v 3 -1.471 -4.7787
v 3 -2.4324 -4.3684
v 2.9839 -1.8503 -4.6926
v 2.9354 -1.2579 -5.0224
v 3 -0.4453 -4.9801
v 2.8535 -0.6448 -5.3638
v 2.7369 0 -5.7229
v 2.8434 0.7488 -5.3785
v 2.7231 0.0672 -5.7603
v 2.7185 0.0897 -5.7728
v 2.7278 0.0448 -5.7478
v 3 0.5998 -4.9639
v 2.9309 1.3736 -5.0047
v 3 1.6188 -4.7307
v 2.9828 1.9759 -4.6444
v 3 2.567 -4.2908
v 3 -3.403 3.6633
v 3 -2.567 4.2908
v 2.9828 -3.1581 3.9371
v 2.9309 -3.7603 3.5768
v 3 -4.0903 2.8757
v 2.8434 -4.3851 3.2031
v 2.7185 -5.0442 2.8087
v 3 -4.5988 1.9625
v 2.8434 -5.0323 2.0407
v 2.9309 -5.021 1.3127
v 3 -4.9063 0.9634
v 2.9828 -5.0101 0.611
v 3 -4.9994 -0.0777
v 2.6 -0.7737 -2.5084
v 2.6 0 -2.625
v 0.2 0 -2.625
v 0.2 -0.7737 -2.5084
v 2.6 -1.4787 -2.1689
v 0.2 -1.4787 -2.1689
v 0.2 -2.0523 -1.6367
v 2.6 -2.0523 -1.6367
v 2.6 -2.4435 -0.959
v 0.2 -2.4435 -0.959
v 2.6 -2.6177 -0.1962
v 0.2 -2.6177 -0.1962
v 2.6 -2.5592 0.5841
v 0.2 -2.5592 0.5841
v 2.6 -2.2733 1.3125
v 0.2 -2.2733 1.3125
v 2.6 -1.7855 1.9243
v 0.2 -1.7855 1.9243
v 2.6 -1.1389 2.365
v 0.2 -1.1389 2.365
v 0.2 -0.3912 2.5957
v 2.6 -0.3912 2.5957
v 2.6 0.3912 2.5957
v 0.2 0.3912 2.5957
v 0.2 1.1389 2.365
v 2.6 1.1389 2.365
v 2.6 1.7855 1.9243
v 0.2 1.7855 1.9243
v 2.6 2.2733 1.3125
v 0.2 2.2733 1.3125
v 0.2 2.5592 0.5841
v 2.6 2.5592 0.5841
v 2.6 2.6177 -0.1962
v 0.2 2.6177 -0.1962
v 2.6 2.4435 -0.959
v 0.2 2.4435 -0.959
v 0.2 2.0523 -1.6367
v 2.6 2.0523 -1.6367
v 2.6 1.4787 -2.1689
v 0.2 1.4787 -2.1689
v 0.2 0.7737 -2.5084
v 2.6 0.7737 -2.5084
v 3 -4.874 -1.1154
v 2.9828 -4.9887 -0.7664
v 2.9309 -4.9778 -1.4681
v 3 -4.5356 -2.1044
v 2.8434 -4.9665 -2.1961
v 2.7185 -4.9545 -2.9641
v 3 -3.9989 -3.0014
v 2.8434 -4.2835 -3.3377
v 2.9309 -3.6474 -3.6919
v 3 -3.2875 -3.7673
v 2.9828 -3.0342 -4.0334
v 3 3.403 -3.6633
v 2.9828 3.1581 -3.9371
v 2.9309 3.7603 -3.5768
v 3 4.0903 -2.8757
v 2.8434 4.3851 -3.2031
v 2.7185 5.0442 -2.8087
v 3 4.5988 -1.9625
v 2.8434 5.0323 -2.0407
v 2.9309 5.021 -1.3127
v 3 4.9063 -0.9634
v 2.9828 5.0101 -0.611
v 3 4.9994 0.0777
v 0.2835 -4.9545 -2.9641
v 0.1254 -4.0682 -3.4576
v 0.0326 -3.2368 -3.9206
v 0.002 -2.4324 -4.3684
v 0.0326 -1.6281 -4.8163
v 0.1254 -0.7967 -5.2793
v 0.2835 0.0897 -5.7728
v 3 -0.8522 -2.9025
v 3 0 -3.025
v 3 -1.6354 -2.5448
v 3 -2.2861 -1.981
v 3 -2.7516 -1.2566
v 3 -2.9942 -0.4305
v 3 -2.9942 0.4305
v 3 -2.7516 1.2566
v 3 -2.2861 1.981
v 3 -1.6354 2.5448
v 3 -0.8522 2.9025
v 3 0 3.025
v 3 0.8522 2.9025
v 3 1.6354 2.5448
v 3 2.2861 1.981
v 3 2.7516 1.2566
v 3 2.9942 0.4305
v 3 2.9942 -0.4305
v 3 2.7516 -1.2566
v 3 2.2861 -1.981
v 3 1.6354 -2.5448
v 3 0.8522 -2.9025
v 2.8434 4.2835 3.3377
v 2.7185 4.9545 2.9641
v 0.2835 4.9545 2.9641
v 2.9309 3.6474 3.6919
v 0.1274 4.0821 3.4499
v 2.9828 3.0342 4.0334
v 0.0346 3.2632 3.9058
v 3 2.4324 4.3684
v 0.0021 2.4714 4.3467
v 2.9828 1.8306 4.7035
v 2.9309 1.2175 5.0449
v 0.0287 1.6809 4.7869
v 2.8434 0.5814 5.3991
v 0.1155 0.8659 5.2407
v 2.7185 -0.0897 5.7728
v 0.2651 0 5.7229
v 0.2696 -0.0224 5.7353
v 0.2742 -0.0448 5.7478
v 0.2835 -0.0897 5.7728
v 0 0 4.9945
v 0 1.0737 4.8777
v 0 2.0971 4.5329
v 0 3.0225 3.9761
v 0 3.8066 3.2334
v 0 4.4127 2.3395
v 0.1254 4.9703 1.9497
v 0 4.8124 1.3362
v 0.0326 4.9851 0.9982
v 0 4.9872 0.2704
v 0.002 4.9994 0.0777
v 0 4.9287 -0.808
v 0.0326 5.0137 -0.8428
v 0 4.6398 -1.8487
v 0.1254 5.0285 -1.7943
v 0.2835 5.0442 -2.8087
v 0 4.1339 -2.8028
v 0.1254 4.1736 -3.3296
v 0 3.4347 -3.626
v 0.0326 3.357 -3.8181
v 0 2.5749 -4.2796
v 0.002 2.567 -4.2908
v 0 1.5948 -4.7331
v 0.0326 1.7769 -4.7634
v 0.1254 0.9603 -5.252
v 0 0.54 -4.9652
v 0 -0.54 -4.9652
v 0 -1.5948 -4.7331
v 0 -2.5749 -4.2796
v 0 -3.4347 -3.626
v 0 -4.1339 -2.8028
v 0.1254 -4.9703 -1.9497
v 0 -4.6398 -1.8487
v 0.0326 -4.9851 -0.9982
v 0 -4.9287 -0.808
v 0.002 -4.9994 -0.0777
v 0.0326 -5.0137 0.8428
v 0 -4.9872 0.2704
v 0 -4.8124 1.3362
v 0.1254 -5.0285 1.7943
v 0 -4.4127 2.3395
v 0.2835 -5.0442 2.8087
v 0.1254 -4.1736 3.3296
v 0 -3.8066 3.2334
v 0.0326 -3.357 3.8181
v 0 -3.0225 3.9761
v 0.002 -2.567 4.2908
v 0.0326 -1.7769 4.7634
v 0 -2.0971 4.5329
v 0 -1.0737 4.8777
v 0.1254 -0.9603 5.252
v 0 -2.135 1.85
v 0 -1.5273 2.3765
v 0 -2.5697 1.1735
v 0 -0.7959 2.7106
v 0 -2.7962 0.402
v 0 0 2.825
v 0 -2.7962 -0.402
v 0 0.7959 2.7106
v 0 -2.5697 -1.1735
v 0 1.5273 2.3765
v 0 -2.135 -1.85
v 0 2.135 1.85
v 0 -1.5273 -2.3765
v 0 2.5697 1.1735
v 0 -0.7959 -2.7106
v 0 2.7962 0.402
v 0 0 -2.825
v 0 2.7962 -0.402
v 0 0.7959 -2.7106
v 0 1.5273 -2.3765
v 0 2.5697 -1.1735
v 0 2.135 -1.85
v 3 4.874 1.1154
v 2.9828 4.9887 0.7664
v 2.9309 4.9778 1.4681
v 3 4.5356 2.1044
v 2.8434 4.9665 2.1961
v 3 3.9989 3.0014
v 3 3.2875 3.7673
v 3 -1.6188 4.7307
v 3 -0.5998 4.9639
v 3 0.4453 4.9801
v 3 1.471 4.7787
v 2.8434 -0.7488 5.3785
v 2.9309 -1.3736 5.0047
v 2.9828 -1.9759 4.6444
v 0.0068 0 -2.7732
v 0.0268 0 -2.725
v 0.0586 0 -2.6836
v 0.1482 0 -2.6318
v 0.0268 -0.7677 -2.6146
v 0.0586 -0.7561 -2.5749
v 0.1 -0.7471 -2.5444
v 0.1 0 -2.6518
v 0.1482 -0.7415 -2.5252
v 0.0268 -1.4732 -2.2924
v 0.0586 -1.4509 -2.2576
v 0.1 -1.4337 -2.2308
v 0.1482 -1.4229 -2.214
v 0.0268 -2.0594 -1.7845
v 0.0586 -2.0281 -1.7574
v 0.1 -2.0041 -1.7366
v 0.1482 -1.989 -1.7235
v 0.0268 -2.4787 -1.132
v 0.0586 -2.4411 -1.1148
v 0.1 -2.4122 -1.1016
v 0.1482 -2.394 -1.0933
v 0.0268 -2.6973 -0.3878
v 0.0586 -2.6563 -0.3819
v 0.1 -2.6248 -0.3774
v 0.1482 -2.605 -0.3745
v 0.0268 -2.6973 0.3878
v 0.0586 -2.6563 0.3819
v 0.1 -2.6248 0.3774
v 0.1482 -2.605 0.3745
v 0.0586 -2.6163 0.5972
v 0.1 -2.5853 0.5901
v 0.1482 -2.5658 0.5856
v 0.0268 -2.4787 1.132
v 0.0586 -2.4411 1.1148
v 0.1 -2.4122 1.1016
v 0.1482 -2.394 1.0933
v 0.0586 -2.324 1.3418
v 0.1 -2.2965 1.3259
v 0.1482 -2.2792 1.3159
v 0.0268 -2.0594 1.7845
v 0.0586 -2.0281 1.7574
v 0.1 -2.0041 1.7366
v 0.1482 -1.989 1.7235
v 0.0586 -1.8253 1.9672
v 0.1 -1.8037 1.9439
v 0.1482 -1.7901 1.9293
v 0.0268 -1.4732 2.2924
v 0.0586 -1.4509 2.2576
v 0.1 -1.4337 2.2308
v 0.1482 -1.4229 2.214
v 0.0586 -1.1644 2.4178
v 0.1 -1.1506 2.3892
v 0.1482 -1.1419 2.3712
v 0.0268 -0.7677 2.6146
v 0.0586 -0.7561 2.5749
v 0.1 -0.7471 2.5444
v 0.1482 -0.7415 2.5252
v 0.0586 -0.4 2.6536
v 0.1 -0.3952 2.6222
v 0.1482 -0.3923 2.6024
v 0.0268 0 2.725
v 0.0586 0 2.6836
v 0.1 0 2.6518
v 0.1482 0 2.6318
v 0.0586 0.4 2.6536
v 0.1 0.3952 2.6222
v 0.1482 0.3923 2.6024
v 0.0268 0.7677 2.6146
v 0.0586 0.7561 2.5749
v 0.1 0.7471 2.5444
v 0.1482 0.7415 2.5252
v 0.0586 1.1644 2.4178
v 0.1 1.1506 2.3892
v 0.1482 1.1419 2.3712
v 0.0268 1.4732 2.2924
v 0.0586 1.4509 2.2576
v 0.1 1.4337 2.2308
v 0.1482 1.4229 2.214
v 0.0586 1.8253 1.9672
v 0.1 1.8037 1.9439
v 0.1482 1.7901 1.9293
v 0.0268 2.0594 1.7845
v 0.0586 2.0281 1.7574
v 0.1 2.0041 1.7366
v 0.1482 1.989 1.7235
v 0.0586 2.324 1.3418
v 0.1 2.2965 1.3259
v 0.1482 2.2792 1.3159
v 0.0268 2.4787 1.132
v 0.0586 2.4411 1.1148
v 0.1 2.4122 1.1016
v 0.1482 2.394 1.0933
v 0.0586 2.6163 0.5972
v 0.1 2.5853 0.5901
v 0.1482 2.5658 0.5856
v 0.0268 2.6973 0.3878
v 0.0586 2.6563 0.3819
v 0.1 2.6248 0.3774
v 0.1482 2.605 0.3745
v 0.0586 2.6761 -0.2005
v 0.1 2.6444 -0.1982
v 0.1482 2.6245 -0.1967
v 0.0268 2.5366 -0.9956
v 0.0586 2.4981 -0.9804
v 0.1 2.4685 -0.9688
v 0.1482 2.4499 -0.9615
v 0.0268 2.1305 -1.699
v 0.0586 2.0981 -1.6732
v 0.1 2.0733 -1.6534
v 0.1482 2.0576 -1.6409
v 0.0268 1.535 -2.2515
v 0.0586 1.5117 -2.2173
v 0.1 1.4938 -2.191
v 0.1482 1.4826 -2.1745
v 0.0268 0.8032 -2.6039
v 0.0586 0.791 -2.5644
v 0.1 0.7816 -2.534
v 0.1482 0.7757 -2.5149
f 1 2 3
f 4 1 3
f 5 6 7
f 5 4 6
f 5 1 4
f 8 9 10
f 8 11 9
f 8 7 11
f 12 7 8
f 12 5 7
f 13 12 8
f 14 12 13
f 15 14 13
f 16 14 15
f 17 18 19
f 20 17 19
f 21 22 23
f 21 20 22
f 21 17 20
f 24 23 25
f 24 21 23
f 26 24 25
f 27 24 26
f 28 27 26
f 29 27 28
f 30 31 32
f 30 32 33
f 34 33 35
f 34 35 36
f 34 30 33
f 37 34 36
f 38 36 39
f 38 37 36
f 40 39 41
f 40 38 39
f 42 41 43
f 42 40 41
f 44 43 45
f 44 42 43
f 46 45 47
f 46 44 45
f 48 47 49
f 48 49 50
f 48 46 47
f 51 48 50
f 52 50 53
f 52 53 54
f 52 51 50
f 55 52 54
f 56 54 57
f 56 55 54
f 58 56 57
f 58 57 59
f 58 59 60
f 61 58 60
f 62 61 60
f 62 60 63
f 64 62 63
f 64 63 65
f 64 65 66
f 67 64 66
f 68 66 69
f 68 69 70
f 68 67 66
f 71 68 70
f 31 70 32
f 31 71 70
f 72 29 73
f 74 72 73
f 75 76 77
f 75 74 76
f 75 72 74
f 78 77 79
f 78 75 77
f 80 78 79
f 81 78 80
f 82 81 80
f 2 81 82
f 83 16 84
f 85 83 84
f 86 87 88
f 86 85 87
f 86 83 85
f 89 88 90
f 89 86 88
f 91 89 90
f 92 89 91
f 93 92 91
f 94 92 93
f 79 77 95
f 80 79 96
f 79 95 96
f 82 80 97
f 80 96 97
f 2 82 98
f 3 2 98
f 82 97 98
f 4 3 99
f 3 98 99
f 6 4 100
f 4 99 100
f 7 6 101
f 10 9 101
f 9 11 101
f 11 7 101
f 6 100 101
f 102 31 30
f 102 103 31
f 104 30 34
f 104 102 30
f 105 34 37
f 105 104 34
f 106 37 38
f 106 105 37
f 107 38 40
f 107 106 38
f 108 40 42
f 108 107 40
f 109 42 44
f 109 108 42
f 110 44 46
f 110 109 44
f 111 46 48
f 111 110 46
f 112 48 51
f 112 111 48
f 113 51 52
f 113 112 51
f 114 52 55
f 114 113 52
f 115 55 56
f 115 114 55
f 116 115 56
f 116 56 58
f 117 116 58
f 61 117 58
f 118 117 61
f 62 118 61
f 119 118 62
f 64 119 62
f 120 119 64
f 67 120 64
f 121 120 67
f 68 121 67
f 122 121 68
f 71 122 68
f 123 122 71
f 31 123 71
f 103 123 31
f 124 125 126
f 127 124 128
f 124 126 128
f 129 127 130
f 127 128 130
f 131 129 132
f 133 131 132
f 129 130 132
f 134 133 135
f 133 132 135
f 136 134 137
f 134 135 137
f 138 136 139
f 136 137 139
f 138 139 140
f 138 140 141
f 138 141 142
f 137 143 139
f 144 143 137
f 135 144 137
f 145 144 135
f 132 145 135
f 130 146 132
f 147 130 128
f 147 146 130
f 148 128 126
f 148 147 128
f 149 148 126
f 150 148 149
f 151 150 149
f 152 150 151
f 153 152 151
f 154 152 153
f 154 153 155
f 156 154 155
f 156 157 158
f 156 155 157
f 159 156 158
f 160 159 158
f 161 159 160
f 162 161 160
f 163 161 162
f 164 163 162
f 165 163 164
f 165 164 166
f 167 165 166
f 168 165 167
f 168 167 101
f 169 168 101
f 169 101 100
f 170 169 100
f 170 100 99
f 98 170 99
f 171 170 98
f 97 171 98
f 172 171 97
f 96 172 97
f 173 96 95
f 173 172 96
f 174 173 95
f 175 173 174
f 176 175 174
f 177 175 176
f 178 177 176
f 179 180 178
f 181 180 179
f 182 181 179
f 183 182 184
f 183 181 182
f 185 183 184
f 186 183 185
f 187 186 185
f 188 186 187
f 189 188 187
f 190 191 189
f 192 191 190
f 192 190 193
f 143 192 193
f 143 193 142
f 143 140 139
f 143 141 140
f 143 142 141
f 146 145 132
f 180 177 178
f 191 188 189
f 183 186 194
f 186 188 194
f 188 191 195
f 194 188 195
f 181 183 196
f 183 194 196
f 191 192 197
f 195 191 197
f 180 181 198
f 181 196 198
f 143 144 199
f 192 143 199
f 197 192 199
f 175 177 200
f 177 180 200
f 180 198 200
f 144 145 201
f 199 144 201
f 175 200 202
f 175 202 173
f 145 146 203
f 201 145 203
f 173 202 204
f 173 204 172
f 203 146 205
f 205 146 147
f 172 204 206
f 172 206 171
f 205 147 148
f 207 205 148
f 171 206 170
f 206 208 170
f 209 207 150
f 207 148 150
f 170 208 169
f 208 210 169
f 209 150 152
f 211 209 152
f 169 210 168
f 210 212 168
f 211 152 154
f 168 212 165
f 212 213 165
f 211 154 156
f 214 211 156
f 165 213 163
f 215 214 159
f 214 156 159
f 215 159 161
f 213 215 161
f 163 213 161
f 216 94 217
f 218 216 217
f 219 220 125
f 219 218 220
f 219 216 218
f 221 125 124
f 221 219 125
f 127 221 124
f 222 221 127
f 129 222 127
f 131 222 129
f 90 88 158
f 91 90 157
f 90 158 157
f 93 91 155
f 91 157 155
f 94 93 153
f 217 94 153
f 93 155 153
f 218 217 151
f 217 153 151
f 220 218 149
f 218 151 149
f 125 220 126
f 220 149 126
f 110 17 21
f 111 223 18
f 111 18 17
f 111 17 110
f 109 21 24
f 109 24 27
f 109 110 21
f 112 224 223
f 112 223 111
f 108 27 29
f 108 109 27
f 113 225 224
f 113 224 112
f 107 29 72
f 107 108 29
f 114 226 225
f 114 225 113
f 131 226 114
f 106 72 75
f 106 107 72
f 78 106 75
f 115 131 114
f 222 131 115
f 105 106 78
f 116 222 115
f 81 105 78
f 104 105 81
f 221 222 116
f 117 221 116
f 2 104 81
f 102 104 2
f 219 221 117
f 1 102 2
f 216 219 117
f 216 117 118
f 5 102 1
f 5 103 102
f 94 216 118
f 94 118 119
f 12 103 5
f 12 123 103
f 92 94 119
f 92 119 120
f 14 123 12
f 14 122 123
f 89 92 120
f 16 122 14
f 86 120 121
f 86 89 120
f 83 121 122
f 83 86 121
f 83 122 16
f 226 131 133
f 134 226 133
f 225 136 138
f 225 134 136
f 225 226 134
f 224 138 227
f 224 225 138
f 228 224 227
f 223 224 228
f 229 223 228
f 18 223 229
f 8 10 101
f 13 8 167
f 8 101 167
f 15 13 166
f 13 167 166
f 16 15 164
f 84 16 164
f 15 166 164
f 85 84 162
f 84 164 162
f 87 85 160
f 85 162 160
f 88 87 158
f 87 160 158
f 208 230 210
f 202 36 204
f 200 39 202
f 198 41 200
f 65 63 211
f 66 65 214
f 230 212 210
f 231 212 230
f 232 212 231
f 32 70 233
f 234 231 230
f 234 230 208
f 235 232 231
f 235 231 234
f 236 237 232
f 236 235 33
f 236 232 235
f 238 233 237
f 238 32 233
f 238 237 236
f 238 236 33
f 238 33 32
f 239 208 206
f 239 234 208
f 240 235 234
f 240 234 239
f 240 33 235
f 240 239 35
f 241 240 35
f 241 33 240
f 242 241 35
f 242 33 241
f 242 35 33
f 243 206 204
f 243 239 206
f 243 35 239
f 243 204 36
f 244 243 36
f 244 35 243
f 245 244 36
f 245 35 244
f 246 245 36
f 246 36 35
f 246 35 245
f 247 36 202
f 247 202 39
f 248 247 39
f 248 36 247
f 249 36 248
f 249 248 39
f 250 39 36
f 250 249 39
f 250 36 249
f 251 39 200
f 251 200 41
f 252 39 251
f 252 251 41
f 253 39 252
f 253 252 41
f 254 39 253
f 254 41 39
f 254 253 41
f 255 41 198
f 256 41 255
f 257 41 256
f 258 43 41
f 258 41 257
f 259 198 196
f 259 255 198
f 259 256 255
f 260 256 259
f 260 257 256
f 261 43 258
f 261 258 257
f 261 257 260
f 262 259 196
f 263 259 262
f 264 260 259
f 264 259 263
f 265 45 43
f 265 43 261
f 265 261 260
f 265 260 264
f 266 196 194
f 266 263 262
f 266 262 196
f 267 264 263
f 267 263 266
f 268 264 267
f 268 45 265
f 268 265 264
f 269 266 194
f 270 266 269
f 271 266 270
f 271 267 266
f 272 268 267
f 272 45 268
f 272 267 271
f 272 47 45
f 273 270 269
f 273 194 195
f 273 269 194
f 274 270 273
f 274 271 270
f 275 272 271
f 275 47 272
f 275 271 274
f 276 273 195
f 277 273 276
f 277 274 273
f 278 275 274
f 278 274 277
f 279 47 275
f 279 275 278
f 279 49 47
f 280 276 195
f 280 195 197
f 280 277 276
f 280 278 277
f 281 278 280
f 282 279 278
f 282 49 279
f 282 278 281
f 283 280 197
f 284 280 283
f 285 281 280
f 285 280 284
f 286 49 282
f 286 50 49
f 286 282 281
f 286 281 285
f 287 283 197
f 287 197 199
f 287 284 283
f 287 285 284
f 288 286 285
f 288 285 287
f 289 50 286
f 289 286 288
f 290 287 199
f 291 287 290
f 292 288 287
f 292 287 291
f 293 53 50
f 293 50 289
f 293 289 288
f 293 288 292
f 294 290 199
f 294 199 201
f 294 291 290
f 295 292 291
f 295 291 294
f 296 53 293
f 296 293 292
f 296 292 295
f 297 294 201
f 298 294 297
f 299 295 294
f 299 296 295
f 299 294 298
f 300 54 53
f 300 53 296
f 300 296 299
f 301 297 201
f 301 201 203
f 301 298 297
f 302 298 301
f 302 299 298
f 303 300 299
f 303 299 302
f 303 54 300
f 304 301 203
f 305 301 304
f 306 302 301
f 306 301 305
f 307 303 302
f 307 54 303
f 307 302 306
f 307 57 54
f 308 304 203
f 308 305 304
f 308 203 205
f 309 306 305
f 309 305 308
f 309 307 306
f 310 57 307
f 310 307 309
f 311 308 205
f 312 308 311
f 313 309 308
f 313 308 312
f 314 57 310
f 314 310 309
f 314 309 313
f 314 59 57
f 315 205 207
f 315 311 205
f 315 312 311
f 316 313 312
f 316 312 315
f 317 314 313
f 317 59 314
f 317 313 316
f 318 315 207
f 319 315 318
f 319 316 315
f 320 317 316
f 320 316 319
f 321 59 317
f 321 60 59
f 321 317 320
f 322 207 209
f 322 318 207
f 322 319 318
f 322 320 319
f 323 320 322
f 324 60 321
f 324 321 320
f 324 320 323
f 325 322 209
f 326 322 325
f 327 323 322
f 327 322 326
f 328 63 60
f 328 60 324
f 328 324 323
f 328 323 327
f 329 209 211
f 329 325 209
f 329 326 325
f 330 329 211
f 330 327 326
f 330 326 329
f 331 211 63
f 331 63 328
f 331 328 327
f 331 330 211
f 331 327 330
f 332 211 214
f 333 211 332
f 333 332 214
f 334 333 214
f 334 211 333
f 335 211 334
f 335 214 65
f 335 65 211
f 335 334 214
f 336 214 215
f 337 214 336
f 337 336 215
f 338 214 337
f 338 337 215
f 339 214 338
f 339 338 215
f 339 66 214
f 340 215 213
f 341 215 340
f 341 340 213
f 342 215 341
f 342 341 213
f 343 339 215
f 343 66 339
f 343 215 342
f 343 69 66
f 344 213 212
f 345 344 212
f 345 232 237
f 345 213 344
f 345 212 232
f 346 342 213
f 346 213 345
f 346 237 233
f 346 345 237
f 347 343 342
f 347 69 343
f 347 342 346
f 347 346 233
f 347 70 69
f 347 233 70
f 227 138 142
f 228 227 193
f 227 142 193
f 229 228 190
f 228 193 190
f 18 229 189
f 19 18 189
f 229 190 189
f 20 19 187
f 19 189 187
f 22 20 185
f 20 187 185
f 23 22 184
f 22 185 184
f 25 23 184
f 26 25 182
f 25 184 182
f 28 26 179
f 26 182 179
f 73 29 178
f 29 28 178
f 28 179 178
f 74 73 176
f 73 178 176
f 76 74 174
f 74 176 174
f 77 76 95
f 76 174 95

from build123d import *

# Parameters (mm, degrees)
RESSALTO_EXTRUS_O1_DEPTH = 3
FILETE1_R                = 0.2
ESBO_O12_OUTSIDE_W       = 88.106
ESBO_O12_OUTSIDE_H       = 86.648
ESBO_O12_OUTSIDE_R       = 5
CORTE_EXTRUS_O3_DEPTH    = 13
CORTE_EXTRUS_O3_DRAFT    = -70
ESBO_O17_OUTSIDE_W       = 88.106
ESBO_O17_OUTSIDE_H       = 86.648
ESBO_O17_OUTSIDE_R       = 4.994498725
CORTE_EXTRUS_O4_DEPTH    = 13
CORTE_EXTRUS_O4_DRAFT    = -70


with BuildPart() as part:
    # Esboço1 → Ressalto-extrusão1 (new body)
    with BuildSketch(Plane(origin=(0, 0, 0), x_dir=(0, 0, -1), z_dir=(1, 0, 0))):
        Polygon((2.808721651, 5.044245833), (-2.964084209, 4.954547218), (-5.77280586, -0.089698615), (-2.808721651, -5.044245833), (2.964084209, -4.954547218), (5.77280586, 0.089698615), align=None)
    extrude(amount=RESSALTO_EXTRUS_O1_DEPTH)

    # Esboço11 → Furo roscado de M6x0.752 (revolve, cut)
    with BuildSketch(Plane(origin=(3, 0, 0), x_dir=(0, 0, -1), z_dir=(0, 1, 0))):
        Polygon((0, 0), (0, 3), (2.625, 3), (2.625, 0.4), (3.025, 0), align=None)
    revolve(axis=Axis((9.35, 0, 0), (-1, 0, 0)), mode=Mode.SUBTRACT)

    # Filete1
    filete1_edges = [part.edges().sort_by_distance(p)[0] for p in [
        (0, 0, 2.625),
    ]]
    fillet(filete1_edges, radius=FILETE1_R)


with BuildPart() as corte_extrus_o3_tool:
    # Esboço12 outside → Corte-extrusão3 (with draft: the straight prism first)
    with BuildSketch(Plane(origin=(3, 0, 0), x_dir=(0, 0, -1), z_dir=(1, 0, 0))):
        Rectangle(ESBO_O12_OUTSIDE_W, ESBO_O12_OUTSIDE_H)
        Circle(ESBO_O12_OUTSIDE_R, mode=Mode.SUBTRACT)
    extrude(amount=-CORTE_EXTRUS_O3_DEPTH)
    # Corte-extrusão3: the draft: its side faces are tilted about the plane it starts from
    corte_extrus_o3_sides = [corte_extrus_o3_tool.faces().sort_by_distance(p)[0] for p in [
        (-3.5, -43.324, 0),
        (-3.5, 0, -44.053),
        (-3.5, 43.324, 0),
        (-3.5, 0, 44.053),
        (-3.5, 0, 5),
    ]]
    draft(corte_extrus_o3_sides, Plane(origin=(3, 0, 0), x_dir=(0, 0, -1), z_dir=(1, 0, 0)), CORTE_EXTRUS_O3_DRAFT)


with BuildPart() as part_1:
    add(part.part)

    # Corte-extrusão3: cut by corte_extrus_o3_tool
    add(corte_extrus_o3_tool.part, mode=Mode.SUBTRACT)


with BuildPart() as corte_extrus_o4_tool:
    # Esboço17 outside → Corte-extrusão4 (with draft: the straight prism first)
    with BuildSketch(Plane.ZY):
        Rectangle(ESBO_O17_OUTSIDE_W, ESBO_O17_OUTSIDE_H)
        Circle(ESBO_O17_OUTSIDE_R, mode=Mode.SUBTRACT)
    extrude(amount=-CORTE_EXTRUS_O4_DEPTH)
    # Corte-extrusão4: the draft: its side faces are tilted about the plane it starts from
    corte_extrus_o4_sides = [corte_extrus_o4_tool.faces().sort_by_distance(p)[0] for p in [
        (6.5, -43.324, 0),
        (6.5, 0, 44.053),
        (6.5, 43.324, 0),
        (6.5, 0, -44.053),
        (6.5, 0, -4.994498725),
    ]]
    draft(corte_extrus_o4_sides, Plane.ZY, CORTE_EXTRUS_O4_DRAFT)


with BuildPart() as part_2:
    add(part_1.part)

    # Corte-extrusão4: cut by corte_extrus_o4_tool
    add(corte_extrus_o4_tool.part, mode=Mode.SUBTRACT)


solid = part_2.part
